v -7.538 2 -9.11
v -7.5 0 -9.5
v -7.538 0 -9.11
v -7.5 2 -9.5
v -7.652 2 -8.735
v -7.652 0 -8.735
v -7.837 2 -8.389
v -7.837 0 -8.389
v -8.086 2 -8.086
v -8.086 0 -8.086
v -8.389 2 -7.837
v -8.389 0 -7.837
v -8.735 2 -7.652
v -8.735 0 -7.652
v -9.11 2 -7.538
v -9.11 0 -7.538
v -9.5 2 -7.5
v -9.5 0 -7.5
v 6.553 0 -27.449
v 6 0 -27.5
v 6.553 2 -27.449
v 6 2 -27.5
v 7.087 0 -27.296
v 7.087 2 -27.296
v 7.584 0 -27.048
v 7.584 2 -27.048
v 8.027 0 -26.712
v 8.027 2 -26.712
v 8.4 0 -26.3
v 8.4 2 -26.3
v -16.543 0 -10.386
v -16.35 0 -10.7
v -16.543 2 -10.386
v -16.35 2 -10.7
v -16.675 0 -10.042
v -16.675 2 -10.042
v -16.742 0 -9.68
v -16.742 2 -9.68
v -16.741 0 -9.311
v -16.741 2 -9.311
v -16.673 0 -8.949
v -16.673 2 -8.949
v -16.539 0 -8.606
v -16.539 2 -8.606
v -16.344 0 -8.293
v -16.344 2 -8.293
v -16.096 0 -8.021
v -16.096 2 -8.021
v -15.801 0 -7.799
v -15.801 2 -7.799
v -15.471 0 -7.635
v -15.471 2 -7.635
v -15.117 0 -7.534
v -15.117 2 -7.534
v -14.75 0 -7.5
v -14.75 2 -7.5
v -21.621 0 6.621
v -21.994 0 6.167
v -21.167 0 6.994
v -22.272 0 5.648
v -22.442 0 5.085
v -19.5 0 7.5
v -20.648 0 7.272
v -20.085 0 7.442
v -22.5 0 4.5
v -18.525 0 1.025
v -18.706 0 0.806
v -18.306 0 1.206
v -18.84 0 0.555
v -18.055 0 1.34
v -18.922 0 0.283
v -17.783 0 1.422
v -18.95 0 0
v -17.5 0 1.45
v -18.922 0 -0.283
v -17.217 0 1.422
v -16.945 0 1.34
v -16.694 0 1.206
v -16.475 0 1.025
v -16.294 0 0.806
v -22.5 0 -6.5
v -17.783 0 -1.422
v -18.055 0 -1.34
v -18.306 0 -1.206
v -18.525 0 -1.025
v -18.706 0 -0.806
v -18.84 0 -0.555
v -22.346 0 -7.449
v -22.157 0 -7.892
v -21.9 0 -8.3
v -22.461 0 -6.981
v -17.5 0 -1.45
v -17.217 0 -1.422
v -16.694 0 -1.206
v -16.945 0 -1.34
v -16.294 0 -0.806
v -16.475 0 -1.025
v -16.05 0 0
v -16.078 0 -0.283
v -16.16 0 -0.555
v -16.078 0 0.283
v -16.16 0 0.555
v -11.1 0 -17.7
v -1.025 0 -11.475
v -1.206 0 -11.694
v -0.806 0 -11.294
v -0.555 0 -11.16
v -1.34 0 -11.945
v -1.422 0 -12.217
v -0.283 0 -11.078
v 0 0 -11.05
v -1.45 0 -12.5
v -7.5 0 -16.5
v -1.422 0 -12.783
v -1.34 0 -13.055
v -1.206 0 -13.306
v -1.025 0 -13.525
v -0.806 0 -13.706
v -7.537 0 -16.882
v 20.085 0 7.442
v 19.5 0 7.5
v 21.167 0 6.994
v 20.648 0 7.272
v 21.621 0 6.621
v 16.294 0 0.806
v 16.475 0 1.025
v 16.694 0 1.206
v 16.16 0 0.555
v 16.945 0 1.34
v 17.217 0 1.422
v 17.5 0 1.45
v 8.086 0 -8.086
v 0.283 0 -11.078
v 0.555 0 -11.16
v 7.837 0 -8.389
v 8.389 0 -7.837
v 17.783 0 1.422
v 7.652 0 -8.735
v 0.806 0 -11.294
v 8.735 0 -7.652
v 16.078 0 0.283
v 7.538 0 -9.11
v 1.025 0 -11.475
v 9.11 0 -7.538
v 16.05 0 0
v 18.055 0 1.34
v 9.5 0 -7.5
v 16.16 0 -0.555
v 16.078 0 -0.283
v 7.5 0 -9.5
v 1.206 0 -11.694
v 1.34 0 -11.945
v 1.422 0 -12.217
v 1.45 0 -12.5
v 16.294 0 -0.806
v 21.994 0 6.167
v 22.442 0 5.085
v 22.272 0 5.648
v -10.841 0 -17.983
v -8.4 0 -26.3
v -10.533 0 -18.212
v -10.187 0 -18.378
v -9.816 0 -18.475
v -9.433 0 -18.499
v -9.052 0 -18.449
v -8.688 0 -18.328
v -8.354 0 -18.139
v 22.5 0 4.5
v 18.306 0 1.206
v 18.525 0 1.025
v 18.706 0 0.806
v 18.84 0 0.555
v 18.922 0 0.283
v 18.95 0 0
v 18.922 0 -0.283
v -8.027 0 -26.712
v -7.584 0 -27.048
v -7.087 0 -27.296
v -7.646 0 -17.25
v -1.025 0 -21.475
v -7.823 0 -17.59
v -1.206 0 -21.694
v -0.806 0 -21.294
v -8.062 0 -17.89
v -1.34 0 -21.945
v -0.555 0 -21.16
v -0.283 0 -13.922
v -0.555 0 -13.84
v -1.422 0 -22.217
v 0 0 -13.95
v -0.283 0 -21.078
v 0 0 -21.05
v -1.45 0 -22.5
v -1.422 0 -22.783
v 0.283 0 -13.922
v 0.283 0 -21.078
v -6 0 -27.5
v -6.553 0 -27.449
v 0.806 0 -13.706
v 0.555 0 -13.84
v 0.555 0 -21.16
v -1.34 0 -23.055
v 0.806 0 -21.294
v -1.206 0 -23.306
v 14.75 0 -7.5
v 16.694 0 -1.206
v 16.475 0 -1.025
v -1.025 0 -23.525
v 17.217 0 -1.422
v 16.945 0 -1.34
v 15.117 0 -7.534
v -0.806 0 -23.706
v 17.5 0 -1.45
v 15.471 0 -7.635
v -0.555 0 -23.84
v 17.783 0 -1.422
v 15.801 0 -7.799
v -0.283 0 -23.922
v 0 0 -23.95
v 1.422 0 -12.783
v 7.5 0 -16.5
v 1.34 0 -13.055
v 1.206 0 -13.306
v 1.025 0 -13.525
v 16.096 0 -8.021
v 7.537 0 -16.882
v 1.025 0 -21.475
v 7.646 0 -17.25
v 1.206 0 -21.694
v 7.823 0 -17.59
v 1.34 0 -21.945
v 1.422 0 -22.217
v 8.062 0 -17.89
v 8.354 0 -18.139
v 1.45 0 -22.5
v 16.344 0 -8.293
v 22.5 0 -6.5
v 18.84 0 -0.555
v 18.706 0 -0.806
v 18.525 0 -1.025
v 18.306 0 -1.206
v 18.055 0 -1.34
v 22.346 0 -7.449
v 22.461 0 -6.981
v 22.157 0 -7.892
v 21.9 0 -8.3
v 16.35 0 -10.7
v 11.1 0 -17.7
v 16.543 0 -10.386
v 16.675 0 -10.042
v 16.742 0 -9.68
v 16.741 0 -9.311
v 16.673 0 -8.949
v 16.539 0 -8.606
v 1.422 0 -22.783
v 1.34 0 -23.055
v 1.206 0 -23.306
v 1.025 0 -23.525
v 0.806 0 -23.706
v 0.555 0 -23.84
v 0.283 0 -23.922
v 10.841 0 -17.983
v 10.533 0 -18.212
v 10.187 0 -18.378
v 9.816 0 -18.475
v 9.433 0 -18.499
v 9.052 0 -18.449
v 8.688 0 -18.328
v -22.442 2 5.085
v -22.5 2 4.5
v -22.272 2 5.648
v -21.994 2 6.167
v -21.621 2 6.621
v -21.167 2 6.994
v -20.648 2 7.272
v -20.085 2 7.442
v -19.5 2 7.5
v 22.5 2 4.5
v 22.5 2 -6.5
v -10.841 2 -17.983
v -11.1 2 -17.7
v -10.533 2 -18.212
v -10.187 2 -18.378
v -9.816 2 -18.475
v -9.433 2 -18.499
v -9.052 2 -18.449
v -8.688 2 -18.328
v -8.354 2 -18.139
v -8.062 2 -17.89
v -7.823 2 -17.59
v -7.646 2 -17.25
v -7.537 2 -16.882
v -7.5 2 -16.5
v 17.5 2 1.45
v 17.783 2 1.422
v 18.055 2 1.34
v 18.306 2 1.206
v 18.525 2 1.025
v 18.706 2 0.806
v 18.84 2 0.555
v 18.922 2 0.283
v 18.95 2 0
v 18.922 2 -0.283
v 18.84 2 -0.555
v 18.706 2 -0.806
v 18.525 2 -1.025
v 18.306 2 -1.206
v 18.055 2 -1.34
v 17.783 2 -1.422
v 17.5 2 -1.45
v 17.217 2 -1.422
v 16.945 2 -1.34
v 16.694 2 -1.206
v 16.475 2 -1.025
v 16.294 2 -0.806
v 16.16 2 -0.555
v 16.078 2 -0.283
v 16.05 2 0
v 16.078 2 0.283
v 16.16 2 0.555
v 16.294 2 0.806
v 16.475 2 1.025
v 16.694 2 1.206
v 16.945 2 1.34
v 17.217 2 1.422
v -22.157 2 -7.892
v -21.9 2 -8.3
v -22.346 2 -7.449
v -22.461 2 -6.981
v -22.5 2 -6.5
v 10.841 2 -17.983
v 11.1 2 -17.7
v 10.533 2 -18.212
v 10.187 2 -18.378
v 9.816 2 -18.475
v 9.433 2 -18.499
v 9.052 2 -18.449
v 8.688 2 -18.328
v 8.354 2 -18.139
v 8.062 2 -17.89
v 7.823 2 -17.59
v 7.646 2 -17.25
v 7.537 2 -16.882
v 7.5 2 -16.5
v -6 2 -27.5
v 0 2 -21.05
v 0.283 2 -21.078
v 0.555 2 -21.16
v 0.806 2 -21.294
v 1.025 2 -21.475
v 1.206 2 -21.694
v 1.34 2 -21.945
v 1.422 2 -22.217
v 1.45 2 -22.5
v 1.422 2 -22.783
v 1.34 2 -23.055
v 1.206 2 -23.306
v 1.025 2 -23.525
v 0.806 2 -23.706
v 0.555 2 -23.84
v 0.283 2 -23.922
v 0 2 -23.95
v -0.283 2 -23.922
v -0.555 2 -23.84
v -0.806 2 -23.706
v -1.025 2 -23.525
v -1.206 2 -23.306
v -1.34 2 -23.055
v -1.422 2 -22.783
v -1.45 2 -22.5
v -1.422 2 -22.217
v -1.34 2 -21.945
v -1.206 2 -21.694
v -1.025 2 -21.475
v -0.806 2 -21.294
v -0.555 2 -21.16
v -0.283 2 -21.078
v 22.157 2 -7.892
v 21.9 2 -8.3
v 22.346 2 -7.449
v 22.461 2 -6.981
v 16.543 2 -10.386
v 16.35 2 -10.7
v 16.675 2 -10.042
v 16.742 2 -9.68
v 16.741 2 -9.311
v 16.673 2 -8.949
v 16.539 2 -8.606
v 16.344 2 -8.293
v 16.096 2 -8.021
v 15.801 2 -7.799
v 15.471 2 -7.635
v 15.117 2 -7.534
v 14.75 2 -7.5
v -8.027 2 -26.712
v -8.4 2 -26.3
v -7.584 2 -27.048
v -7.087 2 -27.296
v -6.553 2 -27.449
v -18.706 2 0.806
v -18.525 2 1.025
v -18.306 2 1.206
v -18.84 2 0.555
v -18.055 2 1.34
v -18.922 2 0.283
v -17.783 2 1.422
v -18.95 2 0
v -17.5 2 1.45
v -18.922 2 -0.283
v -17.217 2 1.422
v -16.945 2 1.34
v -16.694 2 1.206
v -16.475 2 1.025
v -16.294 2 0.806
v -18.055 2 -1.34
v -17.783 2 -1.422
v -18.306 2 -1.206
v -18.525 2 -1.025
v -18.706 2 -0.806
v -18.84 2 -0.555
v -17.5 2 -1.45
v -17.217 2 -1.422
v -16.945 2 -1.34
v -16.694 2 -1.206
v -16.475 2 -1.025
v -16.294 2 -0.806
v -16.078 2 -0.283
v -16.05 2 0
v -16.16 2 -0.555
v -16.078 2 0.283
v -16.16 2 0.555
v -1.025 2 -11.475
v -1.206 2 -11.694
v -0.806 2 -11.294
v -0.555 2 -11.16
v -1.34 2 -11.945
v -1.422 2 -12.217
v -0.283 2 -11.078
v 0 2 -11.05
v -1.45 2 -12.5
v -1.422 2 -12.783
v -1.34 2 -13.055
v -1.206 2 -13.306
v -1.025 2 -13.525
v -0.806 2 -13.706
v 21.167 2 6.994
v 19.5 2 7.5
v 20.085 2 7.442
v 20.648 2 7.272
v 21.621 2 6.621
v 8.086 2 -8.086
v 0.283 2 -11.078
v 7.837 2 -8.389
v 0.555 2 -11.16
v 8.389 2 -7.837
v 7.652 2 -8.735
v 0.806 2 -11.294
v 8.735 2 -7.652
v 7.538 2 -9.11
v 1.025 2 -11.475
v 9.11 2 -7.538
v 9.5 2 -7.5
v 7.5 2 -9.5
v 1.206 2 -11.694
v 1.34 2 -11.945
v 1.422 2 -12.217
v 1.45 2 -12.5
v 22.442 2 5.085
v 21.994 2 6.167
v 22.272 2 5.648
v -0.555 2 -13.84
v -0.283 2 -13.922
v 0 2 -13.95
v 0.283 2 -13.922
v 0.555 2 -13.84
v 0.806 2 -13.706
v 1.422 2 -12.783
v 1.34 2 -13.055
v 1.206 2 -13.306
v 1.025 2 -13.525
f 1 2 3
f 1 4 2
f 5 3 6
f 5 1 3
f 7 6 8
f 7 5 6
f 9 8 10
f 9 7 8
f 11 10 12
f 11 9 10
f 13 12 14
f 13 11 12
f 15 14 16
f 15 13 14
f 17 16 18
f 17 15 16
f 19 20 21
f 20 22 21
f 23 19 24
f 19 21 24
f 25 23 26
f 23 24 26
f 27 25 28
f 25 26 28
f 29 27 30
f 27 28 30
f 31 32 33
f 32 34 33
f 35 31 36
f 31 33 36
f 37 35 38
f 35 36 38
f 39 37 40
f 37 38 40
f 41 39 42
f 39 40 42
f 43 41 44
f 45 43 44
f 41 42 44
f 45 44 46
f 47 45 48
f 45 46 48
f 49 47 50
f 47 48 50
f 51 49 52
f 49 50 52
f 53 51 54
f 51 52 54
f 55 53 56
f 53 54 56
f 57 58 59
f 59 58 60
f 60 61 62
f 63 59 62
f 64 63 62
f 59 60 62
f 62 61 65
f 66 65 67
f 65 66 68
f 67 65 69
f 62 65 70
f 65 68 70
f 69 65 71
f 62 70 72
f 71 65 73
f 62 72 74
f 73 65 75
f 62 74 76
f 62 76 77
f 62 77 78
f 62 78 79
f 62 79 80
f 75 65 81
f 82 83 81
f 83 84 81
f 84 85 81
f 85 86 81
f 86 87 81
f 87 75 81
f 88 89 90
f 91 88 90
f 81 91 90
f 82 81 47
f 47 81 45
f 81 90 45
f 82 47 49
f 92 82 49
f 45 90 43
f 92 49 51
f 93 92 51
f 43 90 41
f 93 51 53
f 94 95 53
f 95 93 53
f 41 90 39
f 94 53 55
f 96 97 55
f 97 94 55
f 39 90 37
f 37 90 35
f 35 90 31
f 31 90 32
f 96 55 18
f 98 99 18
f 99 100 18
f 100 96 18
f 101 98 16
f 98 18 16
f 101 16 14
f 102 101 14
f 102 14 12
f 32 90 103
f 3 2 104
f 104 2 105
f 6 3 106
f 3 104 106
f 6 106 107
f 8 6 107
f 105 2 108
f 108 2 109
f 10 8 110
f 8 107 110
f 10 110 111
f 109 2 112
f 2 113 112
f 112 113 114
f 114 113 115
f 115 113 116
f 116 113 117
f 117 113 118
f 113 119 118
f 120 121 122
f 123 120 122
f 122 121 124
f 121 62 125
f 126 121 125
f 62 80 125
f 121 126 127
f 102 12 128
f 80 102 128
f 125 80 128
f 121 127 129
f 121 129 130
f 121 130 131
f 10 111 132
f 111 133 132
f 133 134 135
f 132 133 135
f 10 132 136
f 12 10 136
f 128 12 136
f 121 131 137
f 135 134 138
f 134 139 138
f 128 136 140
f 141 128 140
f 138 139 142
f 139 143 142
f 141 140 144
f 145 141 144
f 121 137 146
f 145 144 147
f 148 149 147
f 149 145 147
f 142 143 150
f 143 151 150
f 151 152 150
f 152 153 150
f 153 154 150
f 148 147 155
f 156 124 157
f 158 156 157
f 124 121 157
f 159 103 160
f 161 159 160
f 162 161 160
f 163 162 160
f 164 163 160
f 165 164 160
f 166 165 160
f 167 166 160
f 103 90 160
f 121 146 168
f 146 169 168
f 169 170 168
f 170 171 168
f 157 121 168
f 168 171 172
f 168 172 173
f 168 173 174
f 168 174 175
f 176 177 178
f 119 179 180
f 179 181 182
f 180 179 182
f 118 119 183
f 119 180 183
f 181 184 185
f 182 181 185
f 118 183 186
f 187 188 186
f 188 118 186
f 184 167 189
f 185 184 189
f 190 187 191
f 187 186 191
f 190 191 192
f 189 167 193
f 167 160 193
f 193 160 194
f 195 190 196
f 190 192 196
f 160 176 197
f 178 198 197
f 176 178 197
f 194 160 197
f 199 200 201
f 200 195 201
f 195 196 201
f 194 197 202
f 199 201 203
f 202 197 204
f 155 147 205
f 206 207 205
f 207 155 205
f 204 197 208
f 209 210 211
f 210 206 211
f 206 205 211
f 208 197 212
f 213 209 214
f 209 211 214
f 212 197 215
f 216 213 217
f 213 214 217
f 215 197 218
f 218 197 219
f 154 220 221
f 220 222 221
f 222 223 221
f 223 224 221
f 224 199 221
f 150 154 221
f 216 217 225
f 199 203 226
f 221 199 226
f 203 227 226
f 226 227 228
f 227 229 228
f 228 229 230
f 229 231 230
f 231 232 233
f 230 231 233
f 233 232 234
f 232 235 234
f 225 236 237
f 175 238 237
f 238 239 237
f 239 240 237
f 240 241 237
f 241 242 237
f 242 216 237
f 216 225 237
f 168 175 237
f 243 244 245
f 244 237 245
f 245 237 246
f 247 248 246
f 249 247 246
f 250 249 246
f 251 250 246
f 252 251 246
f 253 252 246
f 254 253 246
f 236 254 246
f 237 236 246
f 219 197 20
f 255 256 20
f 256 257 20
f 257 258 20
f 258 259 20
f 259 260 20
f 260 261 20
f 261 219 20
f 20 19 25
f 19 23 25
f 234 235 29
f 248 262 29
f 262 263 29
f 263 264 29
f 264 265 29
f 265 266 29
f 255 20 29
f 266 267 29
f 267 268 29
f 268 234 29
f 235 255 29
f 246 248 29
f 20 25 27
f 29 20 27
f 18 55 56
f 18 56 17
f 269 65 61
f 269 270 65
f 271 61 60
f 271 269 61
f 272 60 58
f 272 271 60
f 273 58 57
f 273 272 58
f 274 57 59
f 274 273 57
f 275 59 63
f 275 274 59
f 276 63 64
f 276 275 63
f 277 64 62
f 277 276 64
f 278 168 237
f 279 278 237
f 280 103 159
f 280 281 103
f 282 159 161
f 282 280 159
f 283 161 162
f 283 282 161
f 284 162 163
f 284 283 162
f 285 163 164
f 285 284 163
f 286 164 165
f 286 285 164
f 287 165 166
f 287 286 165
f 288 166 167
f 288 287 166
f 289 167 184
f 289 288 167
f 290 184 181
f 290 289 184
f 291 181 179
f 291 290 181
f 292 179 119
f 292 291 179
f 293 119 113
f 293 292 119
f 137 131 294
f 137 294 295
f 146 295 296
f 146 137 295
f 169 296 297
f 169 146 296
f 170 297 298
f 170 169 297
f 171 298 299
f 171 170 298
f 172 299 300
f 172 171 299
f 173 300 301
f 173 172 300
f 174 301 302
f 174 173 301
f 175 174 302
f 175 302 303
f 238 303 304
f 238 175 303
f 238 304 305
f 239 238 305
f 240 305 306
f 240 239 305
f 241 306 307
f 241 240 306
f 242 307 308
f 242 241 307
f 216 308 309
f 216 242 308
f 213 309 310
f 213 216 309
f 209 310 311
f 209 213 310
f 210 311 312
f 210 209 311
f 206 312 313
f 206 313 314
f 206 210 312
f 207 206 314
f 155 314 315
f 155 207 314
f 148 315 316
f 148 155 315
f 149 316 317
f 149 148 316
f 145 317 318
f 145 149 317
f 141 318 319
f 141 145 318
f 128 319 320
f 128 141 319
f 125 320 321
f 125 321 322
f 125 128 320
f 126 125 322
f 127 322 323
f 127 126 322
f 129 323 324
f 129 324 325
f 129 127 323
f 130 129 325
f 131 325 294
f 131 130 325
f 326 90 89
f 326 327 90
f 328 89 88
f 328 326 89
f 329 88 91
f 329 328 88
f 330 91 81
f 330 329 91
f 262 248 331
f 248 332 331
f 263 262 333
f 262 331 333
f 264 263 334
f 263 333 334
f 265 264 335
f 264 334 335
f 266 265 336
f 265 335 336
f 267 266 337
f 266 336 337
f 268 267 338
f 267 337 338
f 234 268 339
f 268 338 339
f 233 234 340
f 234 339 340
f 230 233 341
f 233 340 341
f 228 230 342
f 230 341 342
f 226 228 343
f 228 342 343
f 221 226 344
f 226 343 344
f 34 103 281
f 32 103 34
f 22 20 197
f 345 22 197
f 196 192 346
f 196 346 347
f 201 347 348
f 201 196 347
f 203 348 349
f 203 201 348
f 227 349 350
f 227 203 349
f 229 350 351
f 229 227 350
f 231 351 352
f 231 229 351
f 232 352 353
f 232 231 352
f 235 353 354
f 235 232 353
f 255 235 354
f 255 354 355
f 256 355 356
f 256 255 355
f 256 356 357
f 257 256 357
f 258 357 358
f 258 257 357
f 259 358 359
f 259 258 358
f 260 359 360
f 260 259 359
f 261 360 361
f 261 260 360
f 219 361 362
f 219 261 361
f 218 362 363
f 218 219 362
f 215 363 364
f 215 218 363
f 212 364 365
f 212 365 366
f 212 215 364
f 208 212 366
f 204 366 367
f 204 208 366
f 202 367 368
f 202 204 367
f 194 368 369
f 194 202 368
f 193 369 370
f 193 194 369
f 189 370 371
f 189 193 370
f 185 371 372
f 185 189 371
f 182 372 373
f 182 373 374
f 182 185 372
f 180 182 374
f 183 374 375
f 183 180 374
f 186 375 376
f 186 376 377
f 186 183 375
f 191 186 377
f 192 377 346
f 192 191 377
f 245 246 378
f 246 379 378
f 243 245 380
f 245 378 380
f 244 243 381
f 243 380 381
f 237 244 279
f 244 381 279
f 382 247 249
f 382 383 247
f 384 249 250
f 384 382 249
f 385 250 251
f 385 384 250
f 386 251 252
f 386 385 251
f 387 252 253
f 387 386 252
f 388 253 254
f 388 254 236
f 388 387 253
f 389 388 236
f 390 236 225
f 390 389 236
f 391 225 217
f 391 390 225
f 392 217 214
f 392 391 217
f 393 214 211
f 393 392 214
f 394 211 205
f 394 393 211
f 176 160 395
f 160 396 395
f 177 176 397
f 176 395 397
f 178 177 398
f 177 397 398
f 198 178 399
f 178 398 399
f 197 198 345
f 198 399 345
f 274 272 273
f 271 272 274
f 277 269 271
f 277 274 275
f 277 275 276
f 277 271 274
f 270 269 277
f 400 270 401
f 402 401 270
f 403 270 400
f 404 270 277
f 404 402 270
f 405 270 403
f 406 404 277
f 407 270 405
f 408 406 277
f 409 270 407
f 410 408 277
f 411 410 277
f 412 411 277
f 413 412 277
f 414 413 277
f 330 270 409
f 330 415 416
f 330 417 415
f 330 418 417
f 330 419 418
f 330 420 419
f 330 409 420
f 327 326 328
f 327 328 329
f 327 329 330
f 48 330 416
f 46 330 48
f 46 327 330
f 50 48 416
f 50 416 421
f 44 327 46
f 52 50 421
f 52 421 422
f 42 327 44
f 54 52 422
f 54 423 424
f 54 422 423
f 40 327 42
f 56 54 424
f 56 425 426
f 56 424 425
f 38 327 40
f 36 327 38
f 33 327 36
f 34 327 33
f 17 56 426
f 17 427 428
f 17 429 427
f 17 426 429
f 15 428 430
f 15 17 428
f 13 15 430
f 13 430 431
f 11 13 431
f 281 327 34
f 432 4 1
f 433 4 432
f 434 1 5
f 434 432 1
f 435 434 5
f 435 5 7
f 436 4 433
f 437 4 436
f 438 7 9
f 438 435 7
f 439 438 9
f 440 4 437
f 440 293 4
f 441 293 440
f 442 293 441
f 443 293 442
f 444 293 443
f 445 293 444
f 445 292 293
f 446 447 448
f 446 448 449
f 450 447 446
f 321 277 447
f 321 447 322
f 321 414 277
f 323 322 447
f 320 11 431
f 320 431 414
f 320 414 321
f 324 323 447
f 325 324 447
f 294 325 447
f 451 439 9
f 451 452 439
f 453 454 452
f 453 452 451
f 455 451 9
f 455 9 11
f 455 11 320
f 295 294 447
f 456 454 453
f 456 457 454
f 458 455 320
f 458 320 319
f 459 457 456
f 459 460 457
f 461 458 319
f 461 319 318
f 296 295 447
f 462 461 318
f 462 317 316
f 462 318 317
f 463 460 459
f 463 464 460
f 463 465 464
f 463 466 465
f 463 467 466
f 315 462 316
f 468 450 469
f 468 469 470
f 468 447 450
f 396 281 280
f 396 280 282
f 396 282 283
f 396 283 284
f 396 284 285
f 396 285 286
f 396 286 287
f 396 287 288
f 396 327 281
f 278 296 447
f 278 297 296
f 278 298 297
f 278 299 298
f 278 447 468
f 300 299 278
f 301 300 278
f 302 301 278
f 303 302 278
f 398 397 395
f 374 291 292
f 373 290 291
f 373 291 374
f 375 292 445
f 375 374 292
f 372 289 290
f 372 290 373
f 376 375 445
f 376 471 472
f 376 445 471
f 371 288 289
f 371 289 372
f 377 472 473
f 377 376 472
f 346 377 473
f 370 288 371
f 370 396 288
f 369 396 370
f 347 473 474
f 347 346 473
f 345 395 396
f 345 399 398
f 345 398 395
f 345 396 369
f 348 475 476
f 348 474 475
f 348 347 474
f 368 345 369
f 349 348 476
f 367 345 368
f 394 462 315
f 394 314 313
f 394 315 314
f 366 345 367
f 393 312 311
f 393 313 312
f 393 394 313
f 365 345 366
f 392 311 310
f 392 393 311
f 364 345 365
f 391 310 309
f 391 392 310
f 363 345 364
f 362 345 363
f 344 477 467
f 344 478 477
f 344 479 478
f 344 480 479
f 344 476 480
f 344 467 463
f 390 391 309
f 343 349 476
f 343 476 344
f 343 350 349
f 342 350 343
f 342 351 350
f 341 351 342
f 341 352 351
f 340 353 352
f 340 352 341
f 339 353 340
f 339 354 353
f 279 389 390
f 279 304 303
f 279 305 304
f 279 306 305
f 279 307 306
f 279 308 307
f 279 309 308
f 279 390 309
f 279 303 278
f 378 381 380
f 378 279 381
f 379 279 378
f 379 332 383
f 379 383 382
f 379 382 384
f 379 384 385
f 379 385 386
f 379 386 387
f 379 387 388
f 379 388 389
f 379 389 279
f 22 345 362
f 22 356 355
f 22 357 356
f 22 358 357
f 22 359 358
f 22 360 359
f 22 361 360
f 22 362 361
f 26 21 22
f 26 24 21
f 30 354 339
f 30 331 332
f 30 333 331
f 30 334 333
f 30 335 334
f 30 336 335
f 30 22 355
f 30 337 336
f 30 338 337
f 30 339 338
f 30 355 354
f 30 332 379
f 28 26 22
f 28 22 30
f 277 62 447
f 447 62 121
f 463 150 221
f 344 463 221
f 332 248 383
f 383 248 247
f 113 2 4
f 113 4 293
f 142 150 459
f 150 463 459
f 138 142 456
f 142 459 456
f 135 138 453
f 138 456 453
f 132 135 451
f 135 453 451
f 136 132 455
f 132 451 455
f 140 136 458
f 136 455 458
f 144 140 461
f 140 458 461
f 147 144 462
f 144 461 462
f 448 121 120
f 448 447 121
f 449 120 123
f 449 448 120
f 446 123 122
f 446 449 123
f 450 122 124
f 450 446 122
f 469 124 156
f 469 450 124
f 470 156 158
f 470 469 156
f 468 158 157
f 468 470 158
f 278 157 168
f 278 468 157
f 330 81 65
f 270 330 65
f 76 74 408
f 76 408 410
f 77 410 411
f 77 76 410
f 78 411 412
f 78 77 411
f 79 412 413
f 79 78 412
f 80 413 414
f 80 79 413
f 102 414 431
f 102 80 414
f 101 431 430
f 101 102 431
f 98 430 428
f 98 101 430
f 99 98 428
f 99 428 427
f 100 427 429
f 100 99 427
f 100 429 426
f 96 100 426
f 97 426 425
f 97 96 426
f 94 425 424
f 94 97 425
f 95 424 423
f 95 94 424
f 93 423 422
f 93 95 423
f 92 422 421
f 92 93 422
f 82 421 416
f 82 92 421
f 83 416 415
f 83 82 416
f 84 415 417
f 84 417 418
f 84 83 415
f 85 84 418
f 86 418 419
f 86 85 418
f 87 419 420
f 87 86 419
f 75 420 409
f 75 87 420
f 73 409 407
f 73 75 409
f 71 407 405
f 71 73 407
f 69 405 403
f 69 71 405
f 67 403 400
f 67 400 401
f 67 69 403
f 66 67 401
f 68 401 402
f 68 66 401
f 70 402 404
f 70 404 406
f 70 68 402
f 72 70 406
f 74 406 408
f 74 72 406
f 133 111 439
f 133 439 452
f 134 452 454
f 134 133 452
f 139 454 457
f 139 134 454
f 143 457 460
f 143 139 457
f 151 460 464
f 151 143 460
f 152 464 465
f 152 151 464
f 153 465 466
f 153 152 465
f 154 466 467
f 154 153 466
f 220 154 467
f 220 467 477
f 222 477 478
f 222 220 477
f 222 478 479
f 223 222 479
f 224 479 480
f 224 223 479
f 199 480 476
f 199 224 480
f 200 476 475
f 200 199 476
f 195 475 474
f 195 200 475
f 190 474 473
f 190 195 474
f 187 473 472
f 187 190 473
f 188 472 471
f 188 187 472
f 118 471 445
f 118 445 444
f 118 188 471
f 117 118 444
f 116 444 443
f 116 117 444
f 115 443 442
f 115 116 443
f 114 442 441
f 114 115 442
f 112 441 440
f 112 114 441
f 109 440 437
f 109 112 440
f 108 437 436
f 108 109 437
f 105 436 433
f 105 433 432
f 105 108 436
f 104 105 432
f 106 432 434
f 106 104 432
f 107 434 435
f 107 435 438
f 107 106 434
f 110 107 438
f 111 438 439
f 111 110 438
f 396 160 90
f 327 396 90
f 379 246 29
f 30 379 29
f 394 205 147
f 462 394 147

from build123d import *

# Parameters (mm, degrees)
SKETCH_1_R      = 1.45
EXTRUDE_1_DEPTH = 2
FILLET_2_R      = 3
FILLET_3_R      = 2


with BuildPart() as part:
    # 草图1 → 凸台-拉伸1 (new body)
    with BuildSketch(Plane(origin=(0, 0, 0), x_dir=(1, 0, 0), z_dir=(0, 1, 0))):
        Polygon((-7.5, 27.5), (-22.5, 7.5), (-22.5, -7.5), (22.5, -7.5), (22.5, 7.5), (7.5, 27.5), align=None)
        with Locations(Location((-17.5, 0, 0), (0, 0, 270))):
            Circle(SKETCH_1_R, mode=Mode.SUBTRACT)
        with Locations(Location((17.5, 0, 0), (0, 0, 270))):
            Circle(SKETCH_1_R, mode=Mode.SUBTRACT)
        with Locations(Location((0, 12.5, 0), (0, 0, 270))):
            Circle(SKETCH_1_R, mode=Mode.SUBTRACT)
        with Locations(Location((0, 22.5, 0), (0, 0, 270))):
            Circle(SKETCH_1_R, mode=Mode.SUBTRACT)
        Polygon((-7.5, 22.5), (-18.75, 7.5), (-7.5, 7.5), align=None, mode=Mode.SUBTRACT)
        Polygon((18.75, 7.5), (7.5, 7.5), (7.5, 22.5), align=None, mode=Mode.SUBTRACT)
    extrude(amount=EXTRUDE_1_DEPTH)

    # 圆角2
    fillet_2_edges = [part.edges().sort_by_distance(p)[0] for p in [
        (22.5, 1, -7.5),
        (22.5, 1, 7.5),
        (-22.5, 1, 7.5),
        (-22.5, 1, -7.5),
        (-7.5, 1, -27.5),
        (7.5, 1, -27.5),
    ]]
    fillet(fillet_2_edges, radius=FILLET_2_R)

    # 圆角3
    fillet_3_edges = [part.edges().sort_by_distance(p)[0] for p in [
        (-7.5, 1, -7.5),
        (-7.5, 1, -22.5),
        (-18.75, 1, -7.5),
        (18.75, 1, -7.5),
        (7.5, 1, -22.5),
        (7.5, 1, -7.5),
    ]]
    fillet(fillet_3_edges, radius=FILLET_3_R)


solid = part.part
